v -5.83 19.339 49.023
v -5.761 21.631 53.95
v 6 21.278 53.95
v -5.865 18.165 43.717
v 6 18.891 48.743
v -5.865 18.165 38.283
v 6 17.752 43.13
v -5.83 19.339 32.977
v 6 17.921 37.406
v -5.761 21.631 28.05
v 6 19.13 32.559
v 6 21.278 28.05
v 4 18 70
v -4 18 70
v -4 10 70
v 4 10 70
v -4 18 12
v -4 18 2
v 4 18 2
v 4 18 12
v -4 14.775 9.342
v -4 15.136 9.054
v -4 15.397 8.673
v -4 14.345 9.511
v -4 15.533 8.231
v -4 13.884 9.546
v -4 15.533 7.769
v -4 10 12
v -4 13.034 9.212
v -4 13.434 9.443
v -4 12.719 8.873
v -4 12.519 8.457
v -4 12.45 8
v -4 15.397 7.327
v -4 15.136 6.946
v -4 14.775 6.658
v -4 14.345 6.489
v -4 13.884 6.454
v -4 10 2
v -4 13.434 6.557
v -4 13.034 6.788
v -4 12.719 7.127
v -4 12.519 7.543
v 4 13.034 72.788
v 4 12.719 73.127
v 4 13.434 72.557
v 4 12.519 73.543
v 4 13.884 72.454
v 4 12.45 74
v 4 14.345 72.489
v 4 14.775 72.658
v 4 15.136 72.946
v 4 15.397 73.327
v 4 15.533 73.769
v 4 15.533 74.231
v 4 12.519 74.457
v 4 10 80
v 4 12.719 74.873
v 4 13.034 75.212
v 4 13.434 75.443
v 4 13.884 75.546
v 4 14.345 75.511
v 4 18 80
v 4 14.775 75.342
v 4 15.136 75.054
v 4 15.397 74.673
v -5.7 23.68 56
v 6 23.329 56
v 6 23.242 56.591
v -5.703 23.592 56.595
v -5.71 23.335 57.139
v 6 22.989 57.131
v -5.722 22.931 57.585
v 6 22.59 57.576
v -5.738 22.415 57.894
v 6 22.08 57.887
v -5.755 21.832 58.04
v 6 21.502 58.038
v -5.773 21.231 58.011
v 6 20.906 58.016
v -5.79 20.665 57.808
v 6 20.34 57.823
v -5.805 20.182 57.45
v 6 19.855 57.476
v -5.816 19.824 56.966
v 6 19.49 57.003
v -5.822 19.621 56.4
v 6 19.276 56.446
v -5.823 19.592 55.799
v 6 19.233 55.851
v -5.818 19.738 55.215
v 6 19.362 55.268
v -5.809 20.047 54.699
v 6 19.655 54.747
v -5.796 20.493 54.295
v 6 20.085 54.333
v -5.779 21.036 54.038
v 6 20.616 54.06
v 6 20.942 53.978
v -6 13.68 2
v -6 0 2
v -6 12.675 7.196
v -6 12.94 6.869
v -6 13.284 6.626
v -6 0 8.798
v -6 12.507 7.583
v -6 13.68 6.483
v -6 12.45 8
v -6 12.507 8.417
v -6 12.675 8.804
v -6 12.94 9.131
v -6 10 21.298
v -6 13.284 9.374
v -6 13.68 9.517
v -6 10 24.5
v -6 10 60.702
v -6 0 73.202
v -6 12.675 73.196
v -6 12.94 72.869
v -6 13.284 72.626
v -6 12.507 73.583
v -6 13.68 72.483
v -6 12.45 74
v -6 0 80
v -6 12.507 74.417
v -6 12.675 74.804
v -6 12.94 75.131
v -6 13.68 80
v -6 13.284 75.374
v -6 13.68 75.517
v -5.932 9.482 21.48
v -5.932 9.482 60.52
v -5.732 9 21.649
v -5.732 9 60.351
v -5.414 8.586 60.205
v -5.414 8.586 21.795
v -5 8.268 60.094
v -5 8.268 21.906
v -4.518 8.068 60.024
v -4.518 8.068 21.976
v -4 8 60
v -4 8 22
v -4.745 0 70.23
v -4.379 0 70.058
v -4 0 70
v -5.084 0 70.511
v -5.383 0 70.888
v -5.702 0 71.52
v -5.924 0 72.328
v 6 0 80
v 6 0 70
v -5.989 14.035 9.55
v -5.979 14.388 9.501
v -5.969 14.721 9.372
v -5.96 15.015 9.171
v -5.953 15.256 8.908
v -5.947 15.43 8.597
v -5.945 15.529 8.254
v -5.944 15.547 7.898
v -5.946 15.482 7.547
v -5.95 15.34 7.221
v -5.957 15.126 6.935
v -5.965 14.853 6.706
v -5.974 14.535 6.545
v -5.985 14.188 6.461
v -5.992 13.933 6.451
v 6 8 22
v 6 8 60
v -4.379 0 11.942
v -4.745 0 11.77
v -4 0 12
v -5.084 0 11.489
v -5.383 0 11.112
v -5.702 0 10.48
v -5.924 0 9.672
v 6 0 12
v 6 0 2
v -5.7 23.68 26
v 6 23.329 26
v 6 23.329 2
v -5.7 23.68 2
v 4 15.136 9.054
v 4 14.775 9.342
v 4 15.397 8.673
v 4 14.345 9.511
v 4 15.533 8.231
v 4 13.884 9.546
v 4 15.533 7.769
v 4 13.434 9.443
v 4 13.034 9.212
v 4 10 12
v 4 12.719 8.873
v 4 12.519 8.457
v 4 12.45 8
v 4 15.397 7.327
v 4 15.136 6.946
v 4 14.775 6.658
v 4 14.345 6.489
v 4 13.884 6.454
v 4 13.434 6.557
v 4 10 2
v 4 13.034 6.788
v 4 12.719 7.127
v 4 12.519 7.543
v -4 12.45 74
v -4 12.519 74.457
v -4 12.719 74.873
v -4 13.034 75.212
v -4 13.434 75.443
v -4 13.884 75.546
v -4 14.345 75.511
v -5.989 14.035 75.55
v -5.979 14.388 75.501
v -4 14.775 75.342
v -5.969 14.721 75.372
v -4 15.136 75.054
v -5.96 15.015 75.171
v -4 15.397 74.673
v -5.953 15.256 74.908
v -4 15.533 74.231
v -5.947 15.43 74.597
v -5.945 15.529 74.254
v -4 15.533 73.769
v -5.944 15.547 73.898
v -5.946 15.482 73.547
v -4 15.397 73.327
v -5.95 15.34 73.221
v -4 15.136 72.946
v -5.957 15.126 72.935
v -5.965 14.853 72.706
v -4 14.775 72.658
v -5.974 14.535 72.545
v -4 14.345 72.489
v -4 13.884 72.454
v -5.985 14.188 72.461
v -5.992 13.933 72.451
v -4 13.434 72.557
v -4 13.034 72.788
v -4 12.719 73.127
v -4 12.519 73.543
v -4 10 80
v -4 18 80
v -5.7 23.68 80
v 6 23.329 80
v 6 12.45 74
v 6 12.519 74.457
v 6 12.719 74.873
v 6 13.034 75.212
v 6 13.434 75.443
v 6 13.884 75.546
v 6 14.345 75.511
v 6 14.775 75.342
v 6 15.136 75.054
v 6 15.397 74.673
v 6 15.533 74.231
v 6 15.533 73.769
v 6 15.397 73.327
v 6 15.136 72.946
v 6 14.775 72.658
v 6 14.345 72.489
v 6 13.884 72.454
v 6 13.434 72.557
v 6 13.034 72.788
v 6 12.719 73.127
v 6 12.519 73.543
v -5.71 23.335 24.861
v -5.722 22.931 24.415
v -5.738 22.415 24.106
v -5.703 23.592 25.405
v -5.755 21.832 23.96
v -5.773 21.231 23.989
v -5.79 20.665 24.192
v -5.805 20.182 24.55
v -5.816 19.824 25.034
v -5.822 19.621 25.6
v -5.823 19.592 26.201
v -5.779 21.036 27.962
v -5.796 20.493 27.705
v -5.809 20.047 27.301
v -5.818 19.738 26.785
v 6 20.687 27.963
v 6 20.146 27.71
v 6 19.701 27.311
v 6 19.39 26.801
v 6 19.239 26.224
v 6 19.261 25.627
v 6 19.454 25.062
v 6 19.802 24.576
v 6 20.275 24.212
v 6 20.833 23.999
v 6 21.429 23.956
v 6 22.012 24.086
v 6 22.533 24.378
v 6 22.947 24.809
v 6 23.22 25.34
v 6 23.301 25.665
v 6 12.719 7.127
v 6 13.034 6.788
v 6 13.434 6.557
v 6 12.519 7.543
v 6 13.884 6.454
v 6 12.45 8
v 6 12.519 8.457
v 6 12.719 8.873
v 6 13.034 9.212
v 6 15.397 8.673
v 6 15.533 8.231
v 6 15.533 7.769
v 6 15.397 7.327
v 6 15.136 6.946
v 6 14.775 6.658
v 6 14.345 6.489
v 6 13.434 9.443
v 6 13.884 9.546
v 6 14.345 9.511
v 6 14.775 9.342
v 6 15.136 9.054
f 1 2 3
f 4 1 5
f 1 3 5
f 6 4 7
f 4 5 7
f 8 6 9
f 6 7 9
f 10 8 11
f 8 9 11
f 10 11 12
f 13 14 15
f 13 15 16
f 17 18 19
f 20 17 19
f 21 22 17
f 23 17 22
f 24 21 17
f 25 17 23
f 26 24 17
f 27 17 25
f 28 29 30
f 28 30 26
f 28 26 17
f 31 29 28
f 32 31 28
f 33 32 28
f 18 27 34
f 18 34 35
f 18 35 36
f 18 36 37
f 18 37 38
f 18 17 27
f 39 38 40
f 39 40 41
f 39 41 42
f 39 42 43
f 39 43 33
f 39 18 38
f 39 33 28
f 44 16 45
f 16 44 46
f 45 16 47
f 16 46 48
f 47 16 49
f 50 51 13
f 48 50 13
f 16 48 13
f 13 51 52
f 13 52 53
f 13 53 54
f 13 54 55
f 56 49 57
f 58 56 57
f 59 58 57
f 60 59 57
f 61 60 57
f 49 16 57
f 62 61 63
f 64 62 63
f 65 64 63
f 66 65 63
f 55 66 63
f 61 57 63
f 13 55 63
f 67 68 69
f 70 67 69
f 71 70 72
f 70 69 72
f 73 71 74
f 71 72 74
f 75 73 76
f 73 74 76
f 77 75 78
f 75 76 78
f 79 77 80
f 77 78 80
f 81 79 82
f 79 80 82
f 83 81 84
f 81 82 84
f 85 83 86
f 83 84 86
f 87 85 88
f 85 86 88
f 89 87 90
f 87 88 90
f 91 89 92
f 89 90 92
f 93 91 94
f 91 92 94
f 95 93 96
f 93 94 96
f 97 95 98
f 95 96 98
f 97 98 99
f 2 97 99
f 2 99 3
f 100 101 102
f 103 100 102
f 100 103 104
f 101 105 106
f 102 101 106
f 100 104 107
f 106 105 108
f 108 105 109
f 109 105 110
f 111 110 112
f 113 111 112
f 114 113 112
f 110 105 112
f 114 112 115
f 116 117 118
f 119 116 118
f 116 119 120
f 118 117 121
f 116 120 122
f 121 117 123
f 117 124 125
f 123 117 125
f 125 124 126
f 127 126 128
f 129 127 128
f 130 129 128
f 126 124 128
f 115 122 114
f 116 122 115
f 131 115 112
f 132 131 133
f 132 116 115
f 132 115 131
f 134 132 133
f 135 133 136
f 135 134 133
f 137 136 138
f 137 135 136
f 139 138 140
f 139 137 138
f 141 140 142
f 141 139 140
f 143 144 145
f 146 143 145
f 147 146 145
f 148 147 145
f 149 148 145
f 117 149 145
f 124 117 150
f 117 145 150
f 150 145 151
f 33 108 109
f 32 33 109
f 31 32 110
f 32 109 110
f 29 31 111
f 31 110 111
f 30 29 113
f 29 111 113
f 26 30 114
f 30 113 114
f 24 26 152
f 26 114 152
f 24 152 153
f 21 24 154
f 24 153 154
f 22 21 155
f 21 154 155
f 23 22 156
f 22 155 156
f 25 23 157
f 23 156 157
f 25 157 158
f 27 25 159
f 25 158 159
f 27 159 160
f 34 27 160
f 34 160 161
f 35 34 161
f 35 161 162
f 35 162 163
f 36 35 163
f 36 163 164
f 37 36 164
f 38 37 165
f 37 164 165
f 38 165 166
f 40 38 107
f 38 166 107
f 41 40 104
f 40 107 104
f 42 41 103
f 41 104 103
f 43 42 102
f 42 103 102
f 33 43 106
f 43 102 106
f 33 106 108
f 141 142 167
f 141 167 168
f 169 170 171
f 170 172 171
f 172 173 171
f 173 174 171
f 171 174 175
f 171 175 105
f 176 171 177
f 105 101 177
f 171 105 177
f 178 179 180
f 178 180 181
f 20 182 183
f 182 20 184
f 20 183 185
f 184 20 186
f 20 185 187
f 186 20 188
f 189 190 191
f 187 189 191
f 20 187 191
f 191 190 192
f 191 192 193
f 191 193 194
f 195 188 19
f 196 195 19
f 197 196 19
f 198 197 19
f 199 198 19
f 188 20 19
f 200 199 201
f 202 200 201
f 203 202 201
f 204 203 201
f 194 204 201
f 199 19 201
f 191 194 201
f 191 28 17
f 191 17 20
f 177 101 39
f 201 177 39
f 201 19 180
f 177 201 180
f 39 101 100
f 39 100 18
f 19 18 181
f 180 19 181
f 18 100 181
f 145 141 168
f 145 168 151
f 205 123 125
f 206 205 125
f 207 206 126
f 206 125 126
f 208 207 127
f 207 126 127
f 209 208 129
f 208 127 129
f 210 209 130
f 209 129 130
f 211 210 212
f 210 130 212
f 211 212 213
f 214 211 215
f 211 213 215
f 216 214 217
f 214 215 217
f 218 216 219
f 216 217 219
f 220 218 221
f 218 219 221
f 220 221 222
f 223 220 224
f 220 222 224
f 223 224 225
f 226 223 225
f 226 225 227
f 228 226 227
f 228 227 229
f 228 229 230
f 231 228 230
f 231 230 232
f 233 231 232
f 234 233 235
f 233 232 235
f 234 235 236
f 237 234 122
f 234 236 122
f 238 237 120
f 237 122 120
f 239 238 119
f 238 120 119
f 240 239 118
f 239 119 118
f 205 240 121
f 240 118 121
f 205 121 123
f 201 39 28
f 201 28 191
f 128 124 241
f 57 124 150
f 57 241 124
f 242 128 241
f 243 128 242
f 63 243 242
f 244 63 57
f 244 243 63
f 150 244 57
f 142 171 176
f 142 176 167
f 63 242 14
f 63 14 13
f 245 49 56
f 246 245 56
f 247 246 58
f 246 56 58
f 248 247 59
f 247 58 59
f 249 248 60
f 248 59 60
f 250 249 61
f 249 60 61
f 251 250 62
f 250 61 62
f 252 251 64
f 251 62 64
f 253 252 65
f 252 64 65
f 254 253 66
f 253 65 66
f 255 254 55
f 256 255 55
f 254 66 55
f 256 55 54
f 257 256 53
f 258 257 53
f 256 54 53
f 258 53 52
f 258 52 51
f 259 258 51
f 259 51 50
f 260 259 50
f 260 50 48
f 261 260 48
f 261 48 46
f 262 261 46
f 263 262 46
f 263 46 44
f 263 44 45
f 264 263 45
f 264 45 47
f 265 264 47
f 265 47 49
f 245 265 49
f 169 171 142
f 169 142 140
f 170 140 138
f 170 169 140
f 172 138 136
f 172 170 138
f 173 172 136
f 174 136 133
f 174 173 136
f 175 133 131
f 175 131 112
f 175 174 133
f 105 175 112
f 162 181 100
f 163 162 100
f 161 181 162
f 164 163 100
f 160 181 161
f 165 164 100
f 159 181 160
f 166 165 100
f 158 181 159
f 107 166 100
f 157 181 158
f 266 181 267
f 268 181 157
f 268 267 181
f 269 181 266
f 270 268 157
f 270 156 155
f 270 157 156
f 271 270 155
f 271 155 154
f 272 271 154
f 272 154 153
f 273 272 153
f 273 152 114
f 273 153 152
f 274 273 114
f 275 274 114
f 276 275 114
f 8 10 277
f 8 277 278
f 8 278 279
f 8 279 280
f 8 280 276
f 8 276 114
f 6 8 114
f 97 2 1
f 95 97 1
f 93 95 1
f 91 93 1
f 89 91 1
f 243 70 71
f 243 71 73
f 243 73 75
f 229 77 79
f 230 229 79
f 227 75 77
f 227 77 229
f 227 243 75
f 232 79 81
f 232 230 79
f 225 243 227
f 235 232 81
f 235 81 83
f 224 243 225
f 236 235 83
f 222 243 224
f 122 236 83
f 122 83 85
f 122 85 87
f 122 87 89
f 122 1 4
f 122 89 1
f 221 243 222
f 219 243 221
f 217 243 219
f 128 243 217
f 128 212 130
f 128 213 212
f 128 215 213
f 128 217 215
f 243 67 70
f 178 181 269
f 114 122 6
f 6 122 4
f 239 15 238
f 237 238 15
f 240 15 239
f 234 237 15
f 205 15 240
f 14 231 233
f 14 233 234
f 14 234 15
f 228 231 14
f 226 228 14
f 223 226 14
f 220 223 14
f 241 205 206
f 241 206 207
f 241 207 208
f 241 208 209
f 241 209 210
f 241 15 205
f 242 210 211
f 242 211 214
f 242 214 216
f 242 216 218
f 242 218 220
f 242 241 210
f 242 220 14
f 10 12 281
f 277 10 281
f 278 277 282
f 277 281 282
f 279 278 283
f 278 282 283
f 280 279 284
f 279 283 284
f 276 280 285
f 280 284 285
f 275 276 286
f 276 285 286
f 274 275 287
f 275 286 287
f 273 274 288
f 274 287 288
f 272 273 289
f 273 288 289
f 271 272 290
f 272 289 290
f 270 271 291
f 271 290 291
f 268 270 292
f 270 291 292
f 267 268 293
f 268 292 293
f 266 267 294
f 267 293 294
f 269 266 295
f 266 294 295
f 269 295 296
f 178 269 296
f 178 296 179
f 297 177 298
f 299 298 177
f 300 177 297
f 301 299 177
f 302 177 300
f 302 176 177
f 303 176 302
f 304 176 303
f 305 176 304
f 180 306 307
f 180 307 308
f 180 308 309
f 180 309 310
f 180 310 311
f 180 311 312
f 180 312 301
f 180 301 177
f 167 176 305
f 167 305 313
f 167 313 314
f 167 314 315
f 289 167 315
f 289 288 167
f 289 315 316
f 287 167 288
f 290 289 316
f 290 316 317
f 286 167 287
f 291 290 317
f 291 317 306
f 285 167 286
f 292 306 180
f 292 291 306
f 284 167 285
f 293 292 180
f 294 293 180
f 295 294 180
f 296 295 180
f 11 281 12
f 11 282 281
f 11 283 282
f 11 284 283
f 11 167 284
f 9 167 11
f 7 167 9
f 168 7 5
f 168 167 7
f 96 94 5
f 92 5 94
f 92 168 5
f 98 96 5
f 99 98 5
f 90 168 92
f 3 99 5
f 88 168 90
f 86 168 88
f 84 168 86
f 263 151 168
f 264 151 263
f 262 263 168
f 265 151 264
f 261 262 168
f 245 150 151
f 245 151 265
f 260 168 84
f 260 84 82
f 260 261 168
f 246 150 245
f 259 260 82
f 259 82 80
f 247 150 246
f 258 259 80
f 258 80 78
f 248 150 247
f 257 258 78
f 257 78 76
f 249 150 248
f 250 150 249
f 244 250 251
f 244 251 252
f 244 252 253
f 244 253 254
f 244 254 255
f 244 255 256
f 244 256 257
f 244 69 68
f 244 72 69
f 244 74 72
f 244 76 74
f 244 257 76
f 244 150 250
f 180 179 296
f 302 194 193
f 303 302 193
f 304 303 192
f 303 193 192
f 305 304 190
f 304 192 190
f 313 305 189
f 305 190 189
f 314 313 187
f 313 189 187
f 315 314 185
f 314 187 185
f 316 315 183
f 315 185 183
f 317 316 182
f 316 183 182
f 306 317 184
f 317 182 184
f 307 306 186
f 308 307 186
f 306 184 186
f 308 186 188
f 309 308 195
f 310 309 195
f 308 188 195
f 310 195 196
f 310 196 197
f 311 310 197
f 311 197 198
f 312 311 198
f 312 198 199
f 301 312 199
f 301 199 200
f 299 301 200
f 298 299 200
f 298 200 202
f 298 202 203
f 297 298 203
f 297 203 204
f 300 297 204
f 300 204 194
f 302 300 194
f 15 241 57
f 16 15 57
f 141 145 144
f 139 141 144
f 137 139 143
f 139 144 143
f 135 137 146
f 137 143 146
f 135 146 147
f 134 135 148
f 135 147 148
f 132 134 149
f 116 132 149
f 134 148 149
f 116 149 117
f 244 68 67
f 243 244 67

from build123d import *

# Parameters (mm, degrees)
PAD_DEPTH       = 80
POCKET_DEPTH    = 78
POCKET001_DEPTH = 408.7079232475
POCKET002_DEPTH = 408.4326470939
SKETCH004_W     = 93.184578
SKETCH004_H     = 155.633668
SKETCH004_W_2   = 509.235046
SKETCH004_H_2   = 157.082754
POCKET003_DEPTH = 80.001
POCKET004_DEPTH = 12.001
SKETCH006_W     = 8
SKETCH006_H     = 8
POCKET005_DEPTH = 10
SKETCH007_W     = 8
SKETCH007_H     = 8
POCKET006_DEPTH = 10
SKETCH008_R     = 1.55
POCKET007_DEPTH = 12.001
FILLET_R        = 2
FILLET001_R     = 2
FILLET002_R     = 2


with BuildPart() as part:
    # Sketch → Pad (new body)
    with BuildSketch(Plane.XY):
        Polygon((450, 0), (450, 90), (356, 87.18), (355.64, 99.18), (343.64, 98.82), (344, 86.82), (6, 76.68), (5.64, 88.6800000001), (-6.36, 88.3200000001), (-6, 76.32), (-50, 75), (-50, 0), align=None)
    extrude(amount=PAD_DEPTH)

    # Sketch001 (on Face14 of Pad) → Pocket (cut)
    with BuildSketch(Plane.XY.offset(80)):
        Polygon((-50, 15), (-50, 74), (450, 74), (450, 0), (356, 2.82), (356.3, 12.82), (344.3, 13.18), (344, 3.18), (6, 13.32), (6.3, 23.32), (-5.7, 23.68), (-6, 13.68), align=None)
    extrude(amount=-POCKET_DEPTH, mode=Mode.SUBTRACT)

    # Sketch002 (on Face26 of Pocket) → Pocket001 (cut, through all)
    with BuildSketch(Plane(origin=(355.5953641722, -10.6678609252, 0), x_dir=(0.0299865091, 0.9995503035, 0), z_dir=(0.9995503035, -0.0299865091, 0))):
        with BuildLine():
            ThreePointArc((23.4984280855, 56), (19.9988591841, 57.4495689014), (21.4484280855, 53.95))
            ThreePointArc((21.4484280855, 53.95), (17.8329435114, 41), (21.4484280855, 28.05))
            ThreePointArc((21.4484280855, 28.05), (19.9988591841, 24.5504310986), (23.4984280855, 26))
            Line((23.4984280855, 26), (23.4984280855, 56))
        make_face()
    extrude(amount=-POCKET001_DEPTH, mode=Mode.SUBTRACT)

    # Sketch003 (on Face14 of Pocket001) → Pocket002 (cut, through all)
    with BuildSketch(Plane(origin=(358.2929363573, 10.7487880907, 0), x_dir=(-0.0299865091, 0.9995503035, 0), z_dir=(0.9995503035, 0.0299865091, 0))):
        with BuildLine():
            ThreePointArc((88.470997005, 56), (84.9714281036, 57.4495689014), (86.420997005, 53.95))
            ThreePointArc((86.420997005, 53.95), (82.8055124309, 41), (86.420997005, 28.05))
            ThreePointArc((86.420997005, 28.05), (84.9714281036, 24.5504310986), (88.470997005, 26))
            Line((88.470997005, 26), (88.470997005, 56))
        make_face()
    extrude(amount=-POCKET002_DEPTH, mode=Mode.SUBTRACT)

    # Sketch004 (on Face7 of Pocket002) → Pocket003 (cut, through all)
    with BuildSketch(Plane.XY.offset(80)):
        with Locations((-52.592289, 54.389678)):
            Rectangle(SKETCH004_W, SKETCH004_H)
        with Locations((260.617523, 52.795659)):
            Rectangle(SKETCH004_W_2, SKETCH004_H_2)
    extrude(amount=-POCKET003_DEPTH, mode=Mode.SUBTRACT)

    # Sketch005 (on Face3 of Pocket003) → Pocket004 (cut, through all)
    with BuildSketch(Plane(origin=(-6, 0, 0), x_dir=(0, -1, 0), z_dir=(-1, 0, 0))):
        Polygon((12.873752, 2), (-23.68, 2), (-23.68, 84.957535), (-97.468468, 84.957535), (-97.468468, -3.470766), (12.873752, -3.470766), align=None)
    extrude(amount=-POCKET004_DEPTH, mode=Mode.SUBTRACT)

    # Sketch006 (on Face4 of Pocket004) → Pocket005 (cut)
    with BuildSketch(Plane.XY.offset(80)):
        with Locations((0, 14)):
            Rectangle(SKETCH006_W, SKETCH006_H)
    extrude(amount=-POCKET005_DEPTH, mode=Mode.SUBTRACT)

    # Sketch007 (on Face2 of Pocket005) → Pocket006 (cut)
    with BuildSketch(Plane(origin=(0, 0, 2), x_dir=(1, 0, 0), z_dir=(0, 0, -1))):
        with Locations((0, -14)):
            Rectangle(SKETCH007_W, SKETCH007_H)
    extrude(amount=-POCKET006_DEPTH, mode=Mode.SUBTRACT)

    # Sketch008 (on Face1 of Pocket006) → Pocket007 (cut, through all)
    with BuildSketch(Plane(origin=(-6, 0, 0), x_dir=(0, -1, 0), z_dir=(-1, 0, 0))):
        with Locations((-14, 8)):
            Circle(SKETCH008_R)
        with Locations((-14, 74)):
            Circle(SKETCH008_R)
        Polygon((-8, 22), (-8, 60), (0, 70), (0, 12), align=None)
    extrude(amount=-POCKET007_DEPTH, mode=Mode.SUBTRACT)

    # Fillet
    fillet_edges = [part.edges().sort_by_distance(p)[0] for p in [
        (-6, 8, 41),
    ]]
    fillet(fillet_edges, radius=FILLET_R)

    # Fillet001
    fillet001_edges = [part.edges().sort_by_distance(p)[0] for p in [
        (-6, 4, 65),
    ]]
    fillet(fillet001_edges, radius=FILLET001_R)

    # Fillet002
    fillet002_edges = [part.edges().sort_by_distance(p)[0] for p in [
        (-6, 4, 17),
    ]]
    fillet(fillet002_edges, radius=FILLET002_R)


solid = part.part
